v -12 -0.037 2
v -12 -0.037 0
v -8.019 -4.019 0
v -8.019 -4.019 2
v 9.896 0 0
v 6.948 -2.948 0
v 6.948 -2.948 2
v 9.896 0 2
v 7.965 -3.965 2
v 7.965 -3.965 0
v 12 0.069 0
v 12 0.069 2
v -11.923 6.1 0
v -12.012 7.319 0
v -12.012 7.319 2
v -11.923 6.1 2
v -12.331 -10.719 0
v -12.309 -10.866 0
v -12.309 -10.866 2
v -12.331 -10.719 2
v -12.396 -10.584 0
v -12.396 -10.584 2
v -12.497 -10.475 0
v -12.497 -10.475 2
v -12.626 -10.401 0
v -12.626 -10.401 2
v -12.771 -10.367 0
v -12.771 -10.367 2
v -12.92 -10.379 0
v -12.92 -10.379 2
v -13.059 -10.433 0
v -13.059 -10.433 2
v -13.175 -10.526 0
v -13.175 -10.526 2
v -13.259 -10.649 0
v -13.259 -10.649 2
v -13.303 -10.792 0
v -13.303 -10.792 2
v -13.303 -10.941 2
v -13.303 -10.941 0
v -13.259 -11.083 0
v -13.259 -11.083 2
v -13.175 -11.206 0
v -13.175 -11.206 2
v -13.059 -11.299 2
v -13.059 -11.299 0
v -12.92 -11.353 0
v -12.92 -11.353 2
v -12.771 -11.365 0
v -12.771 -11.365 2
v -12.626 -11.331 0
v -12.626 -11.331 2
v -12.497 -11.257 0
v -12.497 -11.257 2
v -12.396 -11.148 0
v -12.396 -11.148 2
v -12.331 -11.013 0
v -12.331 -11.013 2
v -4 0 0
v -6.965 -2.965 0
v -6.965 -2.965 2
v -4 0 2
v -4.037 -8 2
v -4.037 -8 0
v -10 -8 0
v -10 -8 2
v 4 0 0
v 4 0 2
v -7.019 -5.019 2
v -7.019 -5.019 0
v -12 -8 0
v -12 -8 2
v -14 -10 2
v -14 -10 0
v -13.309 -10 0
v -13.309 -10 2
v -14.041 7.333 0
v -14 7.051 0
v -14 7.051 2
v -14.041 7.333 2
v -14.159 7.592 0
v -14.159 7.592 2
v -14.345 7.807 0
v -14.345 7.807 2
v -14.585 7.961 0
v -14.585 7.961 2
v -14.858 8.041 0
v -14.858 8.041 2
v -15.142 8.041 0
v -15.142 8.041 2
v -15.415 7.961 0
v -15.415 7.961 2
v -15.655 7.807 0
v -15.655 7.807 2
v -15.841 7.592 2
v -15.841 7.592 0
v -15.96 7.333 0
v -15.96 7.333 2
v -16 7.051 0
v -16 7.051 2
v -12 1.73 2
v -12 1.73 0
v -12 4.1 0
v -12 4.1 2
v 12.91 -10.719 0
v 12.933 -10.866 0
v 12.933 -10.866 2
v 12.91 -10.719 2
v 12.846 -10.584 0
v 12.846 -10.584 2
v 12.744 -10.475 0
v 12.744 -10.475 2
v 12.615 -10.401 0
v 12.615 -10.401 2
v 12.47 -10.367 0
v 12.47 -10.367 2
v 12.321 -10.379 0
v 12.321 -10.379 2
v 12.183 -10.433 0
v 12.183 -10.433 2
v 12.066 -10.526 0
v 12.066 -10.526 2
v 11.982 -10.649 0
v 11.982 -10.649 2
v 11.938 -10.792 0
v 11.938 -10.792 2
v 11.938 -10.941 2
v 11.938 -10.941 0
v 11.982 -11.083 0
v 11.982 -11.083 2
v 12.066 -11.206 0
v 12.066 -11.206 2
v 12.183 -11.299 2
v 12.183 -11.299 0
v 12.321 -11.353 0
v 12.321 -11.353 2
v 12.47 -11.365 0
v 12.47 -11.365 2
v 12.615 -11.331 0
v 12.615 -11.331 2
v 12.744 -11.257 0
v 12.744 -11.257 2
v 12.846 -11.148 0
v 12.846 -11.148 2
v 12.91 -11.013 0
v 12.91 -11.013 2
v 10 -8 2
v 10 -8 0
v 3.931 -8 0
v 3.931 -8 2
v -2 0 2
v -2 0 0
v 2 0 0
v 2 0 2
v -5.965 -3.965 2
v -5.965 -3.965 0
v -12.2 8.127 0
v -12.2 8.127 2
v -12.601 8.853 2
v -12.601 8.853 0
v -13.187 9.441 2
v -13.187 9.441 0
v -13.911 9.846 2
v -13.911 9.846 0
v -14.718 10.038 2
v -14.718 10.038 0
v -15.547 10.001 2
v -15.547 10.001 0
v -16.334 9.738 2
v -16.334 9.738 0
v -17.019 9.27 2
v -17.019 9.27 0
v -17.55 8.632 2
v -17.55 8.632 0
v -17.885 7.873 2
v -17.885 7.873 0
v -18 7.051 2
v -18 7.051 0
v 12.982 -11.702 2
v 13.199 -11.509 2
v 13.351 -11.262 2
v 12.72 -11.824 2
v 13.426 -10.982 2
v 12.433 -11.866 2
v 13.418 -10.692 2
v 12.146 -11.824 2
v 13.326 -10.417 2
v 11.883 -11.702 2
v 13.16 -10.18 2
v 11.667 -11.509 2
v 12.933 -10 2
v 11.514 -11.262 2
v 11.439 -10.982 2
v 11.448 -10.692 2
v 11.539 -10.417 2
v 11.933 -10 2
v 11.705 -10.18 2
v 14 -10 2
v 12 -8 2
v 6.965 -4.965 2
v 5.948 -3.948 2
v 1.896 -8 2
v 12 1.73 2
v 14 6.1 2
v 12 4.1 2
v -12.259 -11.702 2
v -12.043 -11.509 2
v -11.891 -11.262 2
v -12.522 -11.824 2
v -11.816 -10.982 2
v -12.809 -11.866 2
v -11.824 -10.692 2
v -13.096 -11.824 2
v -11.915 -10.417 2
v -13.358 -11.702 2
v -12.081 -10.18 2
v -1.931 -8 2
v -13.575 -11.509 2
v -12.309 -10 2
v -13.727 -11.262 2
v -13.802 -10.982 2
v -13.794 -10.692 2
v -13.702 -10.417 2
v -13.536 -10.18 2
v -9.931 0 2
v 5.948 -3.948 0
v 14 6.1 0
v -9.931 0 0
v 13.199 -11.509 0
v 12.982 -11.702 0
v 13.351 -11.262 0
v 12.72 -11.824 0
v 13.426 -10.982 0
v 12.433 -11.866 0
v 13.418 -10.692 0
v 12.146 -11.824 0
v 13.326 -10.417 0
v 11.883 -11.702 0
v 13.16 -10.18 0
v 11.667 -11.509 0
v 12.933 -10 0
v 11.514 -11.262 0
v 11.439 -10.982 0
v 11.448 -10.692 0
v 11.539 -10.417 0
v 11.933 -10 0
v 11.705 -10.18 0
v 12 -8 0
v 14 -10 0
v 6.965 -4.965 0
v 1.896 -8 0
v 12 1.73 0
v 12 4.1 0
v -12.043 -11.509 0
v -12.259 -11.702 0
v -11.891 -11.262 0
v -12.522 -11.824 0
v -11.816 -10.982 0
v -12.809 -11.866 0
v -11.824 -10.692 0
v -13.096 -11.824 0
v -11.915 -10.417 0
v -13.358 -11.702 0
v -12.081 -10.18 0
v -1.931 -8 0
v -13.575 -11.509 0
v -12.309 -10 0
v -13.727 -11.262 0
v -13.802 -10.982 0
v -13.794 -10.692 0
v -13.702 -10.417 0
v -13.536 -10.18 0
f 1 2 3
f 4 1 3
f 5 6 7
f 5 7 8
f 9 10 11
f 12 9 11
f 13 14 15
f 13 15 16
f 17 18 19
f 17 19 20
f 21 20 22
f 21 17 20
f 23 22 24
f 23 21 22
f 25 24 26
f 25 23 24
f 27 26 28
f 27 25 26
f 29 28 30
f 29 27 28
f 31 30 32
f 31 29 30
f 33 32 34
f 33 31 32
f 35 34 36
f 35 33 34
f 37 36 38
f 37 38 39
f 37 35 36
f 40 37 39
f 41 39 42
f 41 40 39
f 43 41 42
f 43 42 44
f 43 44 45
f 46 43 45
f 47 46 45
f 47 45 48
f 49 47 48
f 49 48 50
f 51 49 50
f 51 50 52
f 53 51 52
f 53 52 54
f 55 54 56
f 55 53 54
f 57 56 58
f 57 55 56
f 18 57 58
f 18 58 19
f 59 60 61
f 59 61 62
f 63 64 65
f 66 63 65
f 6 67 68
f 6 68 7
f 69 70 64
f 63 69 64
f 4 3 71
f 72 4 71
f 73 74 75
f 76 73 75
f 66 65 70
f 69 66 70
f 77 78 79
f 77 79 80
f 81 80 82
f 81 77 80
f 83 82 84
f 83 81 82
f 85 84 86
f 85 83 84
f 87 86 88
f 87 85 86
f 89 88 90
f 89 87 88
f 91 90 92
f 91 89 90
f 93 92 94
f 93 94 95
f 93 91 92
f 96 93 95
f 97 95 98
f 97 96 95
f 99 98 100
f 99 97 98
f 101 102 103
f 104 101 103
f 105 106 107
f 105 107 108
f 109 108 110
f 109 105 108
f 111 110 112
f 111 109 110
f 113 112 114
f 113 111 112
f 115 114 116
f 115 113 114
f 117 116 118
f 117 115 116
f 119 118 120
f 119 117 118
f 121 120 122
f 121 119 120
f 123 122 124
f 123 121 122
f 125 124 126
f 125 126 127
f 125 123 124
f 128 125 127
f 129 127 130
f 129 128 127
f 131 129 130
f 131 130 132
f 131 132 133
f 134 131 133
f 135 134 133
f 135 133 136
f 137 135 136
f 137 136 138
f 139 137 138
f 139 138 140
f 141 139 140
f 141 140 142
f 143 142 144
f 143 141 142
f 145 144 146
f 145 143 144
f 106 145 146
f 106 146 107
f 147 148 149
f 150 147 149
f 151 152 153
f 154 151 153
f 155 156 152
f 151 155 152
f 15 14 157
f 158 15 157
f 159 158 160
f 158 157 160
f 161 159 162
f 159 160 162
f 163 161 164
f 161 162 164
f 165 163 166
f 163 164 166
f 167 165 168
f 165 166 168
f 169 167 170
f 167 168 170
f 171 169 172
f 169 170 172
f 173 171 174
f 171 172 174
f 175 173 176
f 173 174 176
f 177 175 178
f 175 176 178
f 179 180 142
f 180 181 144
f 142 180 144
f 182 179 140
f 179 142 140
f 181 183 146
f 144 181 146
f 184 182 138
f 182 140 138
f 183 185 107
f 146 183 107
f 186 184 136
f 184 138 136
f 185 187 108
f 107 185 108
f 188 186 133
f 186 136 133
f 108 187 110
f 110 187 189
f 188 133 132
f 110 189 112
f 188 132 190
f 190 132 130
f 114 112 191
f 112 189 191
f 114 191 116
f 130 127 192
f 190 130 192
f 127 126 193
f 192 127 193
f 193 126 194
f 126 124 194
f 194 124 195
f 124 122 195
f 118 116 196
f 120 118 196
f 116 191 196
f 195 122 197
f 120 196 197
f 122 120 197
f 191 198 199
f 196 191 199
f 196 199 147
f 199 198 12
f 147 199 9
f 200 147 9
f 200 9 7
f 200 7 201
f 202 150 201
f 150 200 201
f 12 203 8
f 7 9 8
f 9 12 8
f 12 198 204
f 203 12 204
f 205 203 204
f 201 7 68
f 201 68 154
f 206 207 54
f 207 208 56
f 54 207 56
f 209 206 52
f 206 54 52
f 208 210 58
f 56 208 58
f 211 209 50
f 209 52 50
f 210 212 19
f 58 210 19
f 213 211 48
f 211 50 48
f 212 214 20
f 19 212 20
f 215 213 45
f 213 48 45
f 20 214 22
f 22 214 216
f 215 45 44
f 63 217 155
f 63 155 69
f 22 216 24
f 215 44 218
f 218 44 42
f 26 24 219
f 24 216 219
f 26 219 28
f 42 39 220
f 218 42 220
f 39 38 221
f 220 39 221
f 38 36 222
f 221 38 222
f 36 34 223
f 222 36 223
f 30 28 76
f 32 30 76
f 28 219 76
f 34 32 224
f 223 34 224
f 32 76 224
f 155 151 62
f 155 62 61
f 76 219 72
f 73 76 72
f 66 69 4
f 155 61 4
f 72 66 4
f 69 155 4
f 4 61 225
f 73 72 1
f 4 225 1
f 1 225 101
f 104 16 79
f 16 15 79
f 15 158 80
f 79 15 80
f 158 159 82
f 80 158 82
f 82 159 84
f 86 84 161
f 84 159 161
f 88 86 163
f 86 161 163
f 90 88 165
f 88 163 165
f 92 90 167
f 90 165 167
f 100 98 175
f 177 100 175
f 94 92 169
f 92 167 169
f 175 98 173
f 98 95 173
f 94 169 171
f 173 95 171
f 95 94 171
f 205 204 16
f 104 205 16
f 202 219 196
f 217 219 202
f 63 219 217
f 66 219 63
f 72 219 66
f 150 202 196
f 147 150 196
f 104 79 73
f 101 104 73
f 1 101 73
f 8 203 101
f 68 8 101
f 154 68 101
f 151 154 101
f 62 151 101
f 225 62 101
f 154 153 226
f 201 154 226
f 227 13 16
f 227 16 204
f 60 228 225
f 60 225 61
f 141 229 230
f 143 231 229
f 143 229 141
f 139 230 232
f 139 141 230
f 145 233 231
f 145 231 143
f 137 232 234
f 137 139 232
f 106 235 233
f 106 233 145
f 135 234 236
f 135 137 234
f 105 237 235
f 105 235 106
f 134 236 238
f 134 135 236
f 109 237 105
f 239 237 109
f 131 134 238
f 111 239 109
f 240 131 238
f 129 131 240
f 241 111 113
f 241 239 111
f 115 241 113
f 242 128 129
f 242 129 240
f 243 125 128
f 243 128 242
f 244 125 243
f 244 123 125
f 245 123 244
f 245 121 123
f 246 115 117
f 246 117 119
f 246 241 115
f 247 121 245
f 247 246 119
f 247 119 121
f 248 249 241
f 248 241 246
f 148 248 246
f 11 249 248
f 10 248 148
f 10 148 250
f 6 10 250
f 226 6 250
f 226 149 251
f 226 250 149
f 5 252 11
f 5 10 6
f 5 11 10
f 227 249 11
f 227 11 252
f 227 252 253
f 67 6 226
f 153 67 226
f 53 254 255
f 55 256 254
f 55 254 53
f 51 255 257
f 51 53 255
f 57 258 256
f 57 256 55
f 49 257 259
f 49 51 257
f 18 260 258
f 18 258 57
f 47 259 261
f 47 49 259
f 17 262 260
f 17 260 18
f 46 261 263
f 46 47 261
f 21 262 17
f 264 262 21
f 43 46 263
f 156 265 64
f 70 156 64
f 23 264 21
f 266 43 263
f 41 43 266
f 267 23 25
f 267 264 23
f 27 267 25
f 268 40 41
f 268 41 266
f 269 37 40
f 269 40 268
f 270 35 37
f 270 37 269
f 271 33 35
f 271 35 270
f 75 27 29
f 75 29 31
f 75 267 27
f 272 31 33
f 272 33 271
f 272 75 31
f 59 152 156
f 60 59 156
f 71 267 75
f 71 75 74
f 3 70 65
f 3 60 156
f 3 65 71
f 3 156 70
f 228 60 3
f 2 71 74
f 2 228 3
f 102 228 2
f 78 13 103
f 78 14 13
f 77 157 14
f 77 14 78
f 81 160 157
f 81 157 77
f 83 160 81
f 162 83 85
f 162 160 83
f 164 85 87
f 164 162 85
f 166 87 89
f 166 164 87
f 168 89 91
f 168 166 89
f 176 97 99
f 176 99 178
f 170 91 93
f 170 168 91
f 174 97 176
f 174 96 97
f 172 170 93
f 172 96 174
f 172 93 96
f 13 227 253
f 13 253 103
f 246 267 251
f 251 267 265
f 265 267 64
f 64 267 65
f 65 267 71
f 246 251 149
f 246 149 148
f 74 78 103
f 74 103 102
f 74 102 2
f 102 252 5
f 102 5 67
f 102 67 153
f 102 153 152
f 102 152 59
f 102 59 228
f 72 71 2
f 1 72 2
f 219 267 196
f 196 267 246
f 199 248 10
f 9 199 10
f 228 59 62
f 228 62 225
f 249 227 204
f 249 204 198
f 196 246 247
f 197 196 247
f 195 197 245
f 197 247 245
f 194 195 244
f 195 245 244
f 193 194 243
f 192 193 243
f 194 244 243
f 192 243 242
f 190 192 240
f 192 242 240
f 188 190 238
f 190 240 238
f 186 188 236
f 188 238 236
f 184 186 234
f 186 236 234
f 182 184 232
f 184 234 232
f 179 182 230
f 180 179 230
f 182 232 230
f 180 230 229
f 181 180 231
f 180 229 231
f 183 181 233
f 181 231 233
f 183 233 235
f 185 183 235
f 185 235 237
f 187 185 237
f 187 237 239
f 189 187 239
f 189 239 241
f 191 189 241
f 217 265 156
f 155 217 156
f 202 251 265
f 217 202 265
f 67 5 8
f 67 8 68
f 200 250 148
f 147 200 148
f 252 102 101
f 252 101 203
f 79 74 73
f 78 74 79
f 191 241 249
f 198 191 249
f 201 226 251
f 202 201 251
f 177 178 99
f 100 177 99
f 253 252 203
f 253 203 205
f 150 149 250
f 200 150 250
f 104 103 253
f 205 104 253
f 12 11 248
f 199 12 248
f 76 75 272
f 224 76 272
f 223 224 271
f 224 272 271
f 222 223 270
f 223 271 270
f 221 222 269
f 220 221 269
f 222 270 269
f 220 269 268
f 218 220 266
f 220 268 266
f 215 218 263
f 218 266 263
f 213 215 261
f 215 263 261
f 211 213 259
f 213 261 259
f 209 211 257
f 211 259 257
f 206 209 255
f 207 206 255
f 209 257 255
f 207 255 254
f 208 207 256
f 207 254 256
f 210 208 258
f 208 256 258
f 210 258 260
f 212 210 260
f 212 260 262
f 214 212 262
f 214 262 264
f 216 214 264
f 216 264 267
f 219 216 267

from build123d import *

# Parameters (mm, degrees)
SKETCH_R  = 0.5
SKETCH_W  = 24
SKETCH_H  = 2.370283
PAD_DEPTH = 2


with BuildPart() as part:
    # Sketch → Pad (new body)
    with BuildSketch(Plane.XY):
        with BuildLine():
            Line((-11.923108, 6.1), (14, 6.1))
            Line((14, 6.1), (14, -10))
            Line((12.932709, -10), (14, -10))
            ThreePointArc((11.932709, -10), (12.432709, -11.866025), (12.932709, -10))
            Line((-12.308759, -10), (11.932709, -10))
            ThreePointArc((-13.308759, -10), (-12.808759, -11.866025), (-12.308759, -10))
            Line((-14, -10), (-13.308759, -10))
            Line((-14, -10), (-14, 7.051026))
            ThreePointArc((-14, 7.051026), (-15.000062, 8.051026), (-16, 7.050903))
            Line((-18, 7.050903), (-16, 7.050903))
            ThreePointArc((-12.011962, 7.318663), (-15.134013, 10.048032), (-18, 7.050903))
            Line((-12.011962, 7.318663), (-11.923108, 6.1))
        make_face()
        with Locations((-12.808759, -10.866025)):
            Circle(SKETCH_R, mode=Mode.SUBTRACT)
        with Locations((12.432709, -10.866025)):
            Circle(SKETCH_R, mode=Mode.SUBTRACT)
        with Locations((0, 2.914858)):
            Rectangle(SKETCH_W, SKETCH_H, mode=Mode.SUBTRACT)
        Polygon((-12, -8), (-12, -0.037073), (-8.018537, -4.018537), align=None, mode=Mode.SUBTRACT)
        Polygon((-9.930922, 0), (-6.965461, -2.965461), (-4, 0), align=None, mode=Mode.SUBTRACT)
        Polygon((2, 0), (5.947956, -3.947956), (1.895912, -8), (-1.930922, -8), (-5.965461, -3.965461), (-2, 0), align=None, mode=Mode.SUBTRACT)
        Polygon((4, 0), (6.947956, -2.947956), (9.895912, 0), align=None, mode=Mode.SUBTRACT)
        Polygon((-10, -8), (-7.018537, -5.018537), (-4.037073, -8), align=None, mode=Mode.SUBTRACT)
        Polygon((3.930883, -8), (6.965441, -4.965441), (10, -8), align=None, mode=Mode.SUBTRACT)
        Polygon((7.965441, -3.965441), (12, 0.069117), (12, -8), align=None, mode=Mode.SUBTRACT)
    extrude(amount=PAD_DEPTH)


solid = part.part
